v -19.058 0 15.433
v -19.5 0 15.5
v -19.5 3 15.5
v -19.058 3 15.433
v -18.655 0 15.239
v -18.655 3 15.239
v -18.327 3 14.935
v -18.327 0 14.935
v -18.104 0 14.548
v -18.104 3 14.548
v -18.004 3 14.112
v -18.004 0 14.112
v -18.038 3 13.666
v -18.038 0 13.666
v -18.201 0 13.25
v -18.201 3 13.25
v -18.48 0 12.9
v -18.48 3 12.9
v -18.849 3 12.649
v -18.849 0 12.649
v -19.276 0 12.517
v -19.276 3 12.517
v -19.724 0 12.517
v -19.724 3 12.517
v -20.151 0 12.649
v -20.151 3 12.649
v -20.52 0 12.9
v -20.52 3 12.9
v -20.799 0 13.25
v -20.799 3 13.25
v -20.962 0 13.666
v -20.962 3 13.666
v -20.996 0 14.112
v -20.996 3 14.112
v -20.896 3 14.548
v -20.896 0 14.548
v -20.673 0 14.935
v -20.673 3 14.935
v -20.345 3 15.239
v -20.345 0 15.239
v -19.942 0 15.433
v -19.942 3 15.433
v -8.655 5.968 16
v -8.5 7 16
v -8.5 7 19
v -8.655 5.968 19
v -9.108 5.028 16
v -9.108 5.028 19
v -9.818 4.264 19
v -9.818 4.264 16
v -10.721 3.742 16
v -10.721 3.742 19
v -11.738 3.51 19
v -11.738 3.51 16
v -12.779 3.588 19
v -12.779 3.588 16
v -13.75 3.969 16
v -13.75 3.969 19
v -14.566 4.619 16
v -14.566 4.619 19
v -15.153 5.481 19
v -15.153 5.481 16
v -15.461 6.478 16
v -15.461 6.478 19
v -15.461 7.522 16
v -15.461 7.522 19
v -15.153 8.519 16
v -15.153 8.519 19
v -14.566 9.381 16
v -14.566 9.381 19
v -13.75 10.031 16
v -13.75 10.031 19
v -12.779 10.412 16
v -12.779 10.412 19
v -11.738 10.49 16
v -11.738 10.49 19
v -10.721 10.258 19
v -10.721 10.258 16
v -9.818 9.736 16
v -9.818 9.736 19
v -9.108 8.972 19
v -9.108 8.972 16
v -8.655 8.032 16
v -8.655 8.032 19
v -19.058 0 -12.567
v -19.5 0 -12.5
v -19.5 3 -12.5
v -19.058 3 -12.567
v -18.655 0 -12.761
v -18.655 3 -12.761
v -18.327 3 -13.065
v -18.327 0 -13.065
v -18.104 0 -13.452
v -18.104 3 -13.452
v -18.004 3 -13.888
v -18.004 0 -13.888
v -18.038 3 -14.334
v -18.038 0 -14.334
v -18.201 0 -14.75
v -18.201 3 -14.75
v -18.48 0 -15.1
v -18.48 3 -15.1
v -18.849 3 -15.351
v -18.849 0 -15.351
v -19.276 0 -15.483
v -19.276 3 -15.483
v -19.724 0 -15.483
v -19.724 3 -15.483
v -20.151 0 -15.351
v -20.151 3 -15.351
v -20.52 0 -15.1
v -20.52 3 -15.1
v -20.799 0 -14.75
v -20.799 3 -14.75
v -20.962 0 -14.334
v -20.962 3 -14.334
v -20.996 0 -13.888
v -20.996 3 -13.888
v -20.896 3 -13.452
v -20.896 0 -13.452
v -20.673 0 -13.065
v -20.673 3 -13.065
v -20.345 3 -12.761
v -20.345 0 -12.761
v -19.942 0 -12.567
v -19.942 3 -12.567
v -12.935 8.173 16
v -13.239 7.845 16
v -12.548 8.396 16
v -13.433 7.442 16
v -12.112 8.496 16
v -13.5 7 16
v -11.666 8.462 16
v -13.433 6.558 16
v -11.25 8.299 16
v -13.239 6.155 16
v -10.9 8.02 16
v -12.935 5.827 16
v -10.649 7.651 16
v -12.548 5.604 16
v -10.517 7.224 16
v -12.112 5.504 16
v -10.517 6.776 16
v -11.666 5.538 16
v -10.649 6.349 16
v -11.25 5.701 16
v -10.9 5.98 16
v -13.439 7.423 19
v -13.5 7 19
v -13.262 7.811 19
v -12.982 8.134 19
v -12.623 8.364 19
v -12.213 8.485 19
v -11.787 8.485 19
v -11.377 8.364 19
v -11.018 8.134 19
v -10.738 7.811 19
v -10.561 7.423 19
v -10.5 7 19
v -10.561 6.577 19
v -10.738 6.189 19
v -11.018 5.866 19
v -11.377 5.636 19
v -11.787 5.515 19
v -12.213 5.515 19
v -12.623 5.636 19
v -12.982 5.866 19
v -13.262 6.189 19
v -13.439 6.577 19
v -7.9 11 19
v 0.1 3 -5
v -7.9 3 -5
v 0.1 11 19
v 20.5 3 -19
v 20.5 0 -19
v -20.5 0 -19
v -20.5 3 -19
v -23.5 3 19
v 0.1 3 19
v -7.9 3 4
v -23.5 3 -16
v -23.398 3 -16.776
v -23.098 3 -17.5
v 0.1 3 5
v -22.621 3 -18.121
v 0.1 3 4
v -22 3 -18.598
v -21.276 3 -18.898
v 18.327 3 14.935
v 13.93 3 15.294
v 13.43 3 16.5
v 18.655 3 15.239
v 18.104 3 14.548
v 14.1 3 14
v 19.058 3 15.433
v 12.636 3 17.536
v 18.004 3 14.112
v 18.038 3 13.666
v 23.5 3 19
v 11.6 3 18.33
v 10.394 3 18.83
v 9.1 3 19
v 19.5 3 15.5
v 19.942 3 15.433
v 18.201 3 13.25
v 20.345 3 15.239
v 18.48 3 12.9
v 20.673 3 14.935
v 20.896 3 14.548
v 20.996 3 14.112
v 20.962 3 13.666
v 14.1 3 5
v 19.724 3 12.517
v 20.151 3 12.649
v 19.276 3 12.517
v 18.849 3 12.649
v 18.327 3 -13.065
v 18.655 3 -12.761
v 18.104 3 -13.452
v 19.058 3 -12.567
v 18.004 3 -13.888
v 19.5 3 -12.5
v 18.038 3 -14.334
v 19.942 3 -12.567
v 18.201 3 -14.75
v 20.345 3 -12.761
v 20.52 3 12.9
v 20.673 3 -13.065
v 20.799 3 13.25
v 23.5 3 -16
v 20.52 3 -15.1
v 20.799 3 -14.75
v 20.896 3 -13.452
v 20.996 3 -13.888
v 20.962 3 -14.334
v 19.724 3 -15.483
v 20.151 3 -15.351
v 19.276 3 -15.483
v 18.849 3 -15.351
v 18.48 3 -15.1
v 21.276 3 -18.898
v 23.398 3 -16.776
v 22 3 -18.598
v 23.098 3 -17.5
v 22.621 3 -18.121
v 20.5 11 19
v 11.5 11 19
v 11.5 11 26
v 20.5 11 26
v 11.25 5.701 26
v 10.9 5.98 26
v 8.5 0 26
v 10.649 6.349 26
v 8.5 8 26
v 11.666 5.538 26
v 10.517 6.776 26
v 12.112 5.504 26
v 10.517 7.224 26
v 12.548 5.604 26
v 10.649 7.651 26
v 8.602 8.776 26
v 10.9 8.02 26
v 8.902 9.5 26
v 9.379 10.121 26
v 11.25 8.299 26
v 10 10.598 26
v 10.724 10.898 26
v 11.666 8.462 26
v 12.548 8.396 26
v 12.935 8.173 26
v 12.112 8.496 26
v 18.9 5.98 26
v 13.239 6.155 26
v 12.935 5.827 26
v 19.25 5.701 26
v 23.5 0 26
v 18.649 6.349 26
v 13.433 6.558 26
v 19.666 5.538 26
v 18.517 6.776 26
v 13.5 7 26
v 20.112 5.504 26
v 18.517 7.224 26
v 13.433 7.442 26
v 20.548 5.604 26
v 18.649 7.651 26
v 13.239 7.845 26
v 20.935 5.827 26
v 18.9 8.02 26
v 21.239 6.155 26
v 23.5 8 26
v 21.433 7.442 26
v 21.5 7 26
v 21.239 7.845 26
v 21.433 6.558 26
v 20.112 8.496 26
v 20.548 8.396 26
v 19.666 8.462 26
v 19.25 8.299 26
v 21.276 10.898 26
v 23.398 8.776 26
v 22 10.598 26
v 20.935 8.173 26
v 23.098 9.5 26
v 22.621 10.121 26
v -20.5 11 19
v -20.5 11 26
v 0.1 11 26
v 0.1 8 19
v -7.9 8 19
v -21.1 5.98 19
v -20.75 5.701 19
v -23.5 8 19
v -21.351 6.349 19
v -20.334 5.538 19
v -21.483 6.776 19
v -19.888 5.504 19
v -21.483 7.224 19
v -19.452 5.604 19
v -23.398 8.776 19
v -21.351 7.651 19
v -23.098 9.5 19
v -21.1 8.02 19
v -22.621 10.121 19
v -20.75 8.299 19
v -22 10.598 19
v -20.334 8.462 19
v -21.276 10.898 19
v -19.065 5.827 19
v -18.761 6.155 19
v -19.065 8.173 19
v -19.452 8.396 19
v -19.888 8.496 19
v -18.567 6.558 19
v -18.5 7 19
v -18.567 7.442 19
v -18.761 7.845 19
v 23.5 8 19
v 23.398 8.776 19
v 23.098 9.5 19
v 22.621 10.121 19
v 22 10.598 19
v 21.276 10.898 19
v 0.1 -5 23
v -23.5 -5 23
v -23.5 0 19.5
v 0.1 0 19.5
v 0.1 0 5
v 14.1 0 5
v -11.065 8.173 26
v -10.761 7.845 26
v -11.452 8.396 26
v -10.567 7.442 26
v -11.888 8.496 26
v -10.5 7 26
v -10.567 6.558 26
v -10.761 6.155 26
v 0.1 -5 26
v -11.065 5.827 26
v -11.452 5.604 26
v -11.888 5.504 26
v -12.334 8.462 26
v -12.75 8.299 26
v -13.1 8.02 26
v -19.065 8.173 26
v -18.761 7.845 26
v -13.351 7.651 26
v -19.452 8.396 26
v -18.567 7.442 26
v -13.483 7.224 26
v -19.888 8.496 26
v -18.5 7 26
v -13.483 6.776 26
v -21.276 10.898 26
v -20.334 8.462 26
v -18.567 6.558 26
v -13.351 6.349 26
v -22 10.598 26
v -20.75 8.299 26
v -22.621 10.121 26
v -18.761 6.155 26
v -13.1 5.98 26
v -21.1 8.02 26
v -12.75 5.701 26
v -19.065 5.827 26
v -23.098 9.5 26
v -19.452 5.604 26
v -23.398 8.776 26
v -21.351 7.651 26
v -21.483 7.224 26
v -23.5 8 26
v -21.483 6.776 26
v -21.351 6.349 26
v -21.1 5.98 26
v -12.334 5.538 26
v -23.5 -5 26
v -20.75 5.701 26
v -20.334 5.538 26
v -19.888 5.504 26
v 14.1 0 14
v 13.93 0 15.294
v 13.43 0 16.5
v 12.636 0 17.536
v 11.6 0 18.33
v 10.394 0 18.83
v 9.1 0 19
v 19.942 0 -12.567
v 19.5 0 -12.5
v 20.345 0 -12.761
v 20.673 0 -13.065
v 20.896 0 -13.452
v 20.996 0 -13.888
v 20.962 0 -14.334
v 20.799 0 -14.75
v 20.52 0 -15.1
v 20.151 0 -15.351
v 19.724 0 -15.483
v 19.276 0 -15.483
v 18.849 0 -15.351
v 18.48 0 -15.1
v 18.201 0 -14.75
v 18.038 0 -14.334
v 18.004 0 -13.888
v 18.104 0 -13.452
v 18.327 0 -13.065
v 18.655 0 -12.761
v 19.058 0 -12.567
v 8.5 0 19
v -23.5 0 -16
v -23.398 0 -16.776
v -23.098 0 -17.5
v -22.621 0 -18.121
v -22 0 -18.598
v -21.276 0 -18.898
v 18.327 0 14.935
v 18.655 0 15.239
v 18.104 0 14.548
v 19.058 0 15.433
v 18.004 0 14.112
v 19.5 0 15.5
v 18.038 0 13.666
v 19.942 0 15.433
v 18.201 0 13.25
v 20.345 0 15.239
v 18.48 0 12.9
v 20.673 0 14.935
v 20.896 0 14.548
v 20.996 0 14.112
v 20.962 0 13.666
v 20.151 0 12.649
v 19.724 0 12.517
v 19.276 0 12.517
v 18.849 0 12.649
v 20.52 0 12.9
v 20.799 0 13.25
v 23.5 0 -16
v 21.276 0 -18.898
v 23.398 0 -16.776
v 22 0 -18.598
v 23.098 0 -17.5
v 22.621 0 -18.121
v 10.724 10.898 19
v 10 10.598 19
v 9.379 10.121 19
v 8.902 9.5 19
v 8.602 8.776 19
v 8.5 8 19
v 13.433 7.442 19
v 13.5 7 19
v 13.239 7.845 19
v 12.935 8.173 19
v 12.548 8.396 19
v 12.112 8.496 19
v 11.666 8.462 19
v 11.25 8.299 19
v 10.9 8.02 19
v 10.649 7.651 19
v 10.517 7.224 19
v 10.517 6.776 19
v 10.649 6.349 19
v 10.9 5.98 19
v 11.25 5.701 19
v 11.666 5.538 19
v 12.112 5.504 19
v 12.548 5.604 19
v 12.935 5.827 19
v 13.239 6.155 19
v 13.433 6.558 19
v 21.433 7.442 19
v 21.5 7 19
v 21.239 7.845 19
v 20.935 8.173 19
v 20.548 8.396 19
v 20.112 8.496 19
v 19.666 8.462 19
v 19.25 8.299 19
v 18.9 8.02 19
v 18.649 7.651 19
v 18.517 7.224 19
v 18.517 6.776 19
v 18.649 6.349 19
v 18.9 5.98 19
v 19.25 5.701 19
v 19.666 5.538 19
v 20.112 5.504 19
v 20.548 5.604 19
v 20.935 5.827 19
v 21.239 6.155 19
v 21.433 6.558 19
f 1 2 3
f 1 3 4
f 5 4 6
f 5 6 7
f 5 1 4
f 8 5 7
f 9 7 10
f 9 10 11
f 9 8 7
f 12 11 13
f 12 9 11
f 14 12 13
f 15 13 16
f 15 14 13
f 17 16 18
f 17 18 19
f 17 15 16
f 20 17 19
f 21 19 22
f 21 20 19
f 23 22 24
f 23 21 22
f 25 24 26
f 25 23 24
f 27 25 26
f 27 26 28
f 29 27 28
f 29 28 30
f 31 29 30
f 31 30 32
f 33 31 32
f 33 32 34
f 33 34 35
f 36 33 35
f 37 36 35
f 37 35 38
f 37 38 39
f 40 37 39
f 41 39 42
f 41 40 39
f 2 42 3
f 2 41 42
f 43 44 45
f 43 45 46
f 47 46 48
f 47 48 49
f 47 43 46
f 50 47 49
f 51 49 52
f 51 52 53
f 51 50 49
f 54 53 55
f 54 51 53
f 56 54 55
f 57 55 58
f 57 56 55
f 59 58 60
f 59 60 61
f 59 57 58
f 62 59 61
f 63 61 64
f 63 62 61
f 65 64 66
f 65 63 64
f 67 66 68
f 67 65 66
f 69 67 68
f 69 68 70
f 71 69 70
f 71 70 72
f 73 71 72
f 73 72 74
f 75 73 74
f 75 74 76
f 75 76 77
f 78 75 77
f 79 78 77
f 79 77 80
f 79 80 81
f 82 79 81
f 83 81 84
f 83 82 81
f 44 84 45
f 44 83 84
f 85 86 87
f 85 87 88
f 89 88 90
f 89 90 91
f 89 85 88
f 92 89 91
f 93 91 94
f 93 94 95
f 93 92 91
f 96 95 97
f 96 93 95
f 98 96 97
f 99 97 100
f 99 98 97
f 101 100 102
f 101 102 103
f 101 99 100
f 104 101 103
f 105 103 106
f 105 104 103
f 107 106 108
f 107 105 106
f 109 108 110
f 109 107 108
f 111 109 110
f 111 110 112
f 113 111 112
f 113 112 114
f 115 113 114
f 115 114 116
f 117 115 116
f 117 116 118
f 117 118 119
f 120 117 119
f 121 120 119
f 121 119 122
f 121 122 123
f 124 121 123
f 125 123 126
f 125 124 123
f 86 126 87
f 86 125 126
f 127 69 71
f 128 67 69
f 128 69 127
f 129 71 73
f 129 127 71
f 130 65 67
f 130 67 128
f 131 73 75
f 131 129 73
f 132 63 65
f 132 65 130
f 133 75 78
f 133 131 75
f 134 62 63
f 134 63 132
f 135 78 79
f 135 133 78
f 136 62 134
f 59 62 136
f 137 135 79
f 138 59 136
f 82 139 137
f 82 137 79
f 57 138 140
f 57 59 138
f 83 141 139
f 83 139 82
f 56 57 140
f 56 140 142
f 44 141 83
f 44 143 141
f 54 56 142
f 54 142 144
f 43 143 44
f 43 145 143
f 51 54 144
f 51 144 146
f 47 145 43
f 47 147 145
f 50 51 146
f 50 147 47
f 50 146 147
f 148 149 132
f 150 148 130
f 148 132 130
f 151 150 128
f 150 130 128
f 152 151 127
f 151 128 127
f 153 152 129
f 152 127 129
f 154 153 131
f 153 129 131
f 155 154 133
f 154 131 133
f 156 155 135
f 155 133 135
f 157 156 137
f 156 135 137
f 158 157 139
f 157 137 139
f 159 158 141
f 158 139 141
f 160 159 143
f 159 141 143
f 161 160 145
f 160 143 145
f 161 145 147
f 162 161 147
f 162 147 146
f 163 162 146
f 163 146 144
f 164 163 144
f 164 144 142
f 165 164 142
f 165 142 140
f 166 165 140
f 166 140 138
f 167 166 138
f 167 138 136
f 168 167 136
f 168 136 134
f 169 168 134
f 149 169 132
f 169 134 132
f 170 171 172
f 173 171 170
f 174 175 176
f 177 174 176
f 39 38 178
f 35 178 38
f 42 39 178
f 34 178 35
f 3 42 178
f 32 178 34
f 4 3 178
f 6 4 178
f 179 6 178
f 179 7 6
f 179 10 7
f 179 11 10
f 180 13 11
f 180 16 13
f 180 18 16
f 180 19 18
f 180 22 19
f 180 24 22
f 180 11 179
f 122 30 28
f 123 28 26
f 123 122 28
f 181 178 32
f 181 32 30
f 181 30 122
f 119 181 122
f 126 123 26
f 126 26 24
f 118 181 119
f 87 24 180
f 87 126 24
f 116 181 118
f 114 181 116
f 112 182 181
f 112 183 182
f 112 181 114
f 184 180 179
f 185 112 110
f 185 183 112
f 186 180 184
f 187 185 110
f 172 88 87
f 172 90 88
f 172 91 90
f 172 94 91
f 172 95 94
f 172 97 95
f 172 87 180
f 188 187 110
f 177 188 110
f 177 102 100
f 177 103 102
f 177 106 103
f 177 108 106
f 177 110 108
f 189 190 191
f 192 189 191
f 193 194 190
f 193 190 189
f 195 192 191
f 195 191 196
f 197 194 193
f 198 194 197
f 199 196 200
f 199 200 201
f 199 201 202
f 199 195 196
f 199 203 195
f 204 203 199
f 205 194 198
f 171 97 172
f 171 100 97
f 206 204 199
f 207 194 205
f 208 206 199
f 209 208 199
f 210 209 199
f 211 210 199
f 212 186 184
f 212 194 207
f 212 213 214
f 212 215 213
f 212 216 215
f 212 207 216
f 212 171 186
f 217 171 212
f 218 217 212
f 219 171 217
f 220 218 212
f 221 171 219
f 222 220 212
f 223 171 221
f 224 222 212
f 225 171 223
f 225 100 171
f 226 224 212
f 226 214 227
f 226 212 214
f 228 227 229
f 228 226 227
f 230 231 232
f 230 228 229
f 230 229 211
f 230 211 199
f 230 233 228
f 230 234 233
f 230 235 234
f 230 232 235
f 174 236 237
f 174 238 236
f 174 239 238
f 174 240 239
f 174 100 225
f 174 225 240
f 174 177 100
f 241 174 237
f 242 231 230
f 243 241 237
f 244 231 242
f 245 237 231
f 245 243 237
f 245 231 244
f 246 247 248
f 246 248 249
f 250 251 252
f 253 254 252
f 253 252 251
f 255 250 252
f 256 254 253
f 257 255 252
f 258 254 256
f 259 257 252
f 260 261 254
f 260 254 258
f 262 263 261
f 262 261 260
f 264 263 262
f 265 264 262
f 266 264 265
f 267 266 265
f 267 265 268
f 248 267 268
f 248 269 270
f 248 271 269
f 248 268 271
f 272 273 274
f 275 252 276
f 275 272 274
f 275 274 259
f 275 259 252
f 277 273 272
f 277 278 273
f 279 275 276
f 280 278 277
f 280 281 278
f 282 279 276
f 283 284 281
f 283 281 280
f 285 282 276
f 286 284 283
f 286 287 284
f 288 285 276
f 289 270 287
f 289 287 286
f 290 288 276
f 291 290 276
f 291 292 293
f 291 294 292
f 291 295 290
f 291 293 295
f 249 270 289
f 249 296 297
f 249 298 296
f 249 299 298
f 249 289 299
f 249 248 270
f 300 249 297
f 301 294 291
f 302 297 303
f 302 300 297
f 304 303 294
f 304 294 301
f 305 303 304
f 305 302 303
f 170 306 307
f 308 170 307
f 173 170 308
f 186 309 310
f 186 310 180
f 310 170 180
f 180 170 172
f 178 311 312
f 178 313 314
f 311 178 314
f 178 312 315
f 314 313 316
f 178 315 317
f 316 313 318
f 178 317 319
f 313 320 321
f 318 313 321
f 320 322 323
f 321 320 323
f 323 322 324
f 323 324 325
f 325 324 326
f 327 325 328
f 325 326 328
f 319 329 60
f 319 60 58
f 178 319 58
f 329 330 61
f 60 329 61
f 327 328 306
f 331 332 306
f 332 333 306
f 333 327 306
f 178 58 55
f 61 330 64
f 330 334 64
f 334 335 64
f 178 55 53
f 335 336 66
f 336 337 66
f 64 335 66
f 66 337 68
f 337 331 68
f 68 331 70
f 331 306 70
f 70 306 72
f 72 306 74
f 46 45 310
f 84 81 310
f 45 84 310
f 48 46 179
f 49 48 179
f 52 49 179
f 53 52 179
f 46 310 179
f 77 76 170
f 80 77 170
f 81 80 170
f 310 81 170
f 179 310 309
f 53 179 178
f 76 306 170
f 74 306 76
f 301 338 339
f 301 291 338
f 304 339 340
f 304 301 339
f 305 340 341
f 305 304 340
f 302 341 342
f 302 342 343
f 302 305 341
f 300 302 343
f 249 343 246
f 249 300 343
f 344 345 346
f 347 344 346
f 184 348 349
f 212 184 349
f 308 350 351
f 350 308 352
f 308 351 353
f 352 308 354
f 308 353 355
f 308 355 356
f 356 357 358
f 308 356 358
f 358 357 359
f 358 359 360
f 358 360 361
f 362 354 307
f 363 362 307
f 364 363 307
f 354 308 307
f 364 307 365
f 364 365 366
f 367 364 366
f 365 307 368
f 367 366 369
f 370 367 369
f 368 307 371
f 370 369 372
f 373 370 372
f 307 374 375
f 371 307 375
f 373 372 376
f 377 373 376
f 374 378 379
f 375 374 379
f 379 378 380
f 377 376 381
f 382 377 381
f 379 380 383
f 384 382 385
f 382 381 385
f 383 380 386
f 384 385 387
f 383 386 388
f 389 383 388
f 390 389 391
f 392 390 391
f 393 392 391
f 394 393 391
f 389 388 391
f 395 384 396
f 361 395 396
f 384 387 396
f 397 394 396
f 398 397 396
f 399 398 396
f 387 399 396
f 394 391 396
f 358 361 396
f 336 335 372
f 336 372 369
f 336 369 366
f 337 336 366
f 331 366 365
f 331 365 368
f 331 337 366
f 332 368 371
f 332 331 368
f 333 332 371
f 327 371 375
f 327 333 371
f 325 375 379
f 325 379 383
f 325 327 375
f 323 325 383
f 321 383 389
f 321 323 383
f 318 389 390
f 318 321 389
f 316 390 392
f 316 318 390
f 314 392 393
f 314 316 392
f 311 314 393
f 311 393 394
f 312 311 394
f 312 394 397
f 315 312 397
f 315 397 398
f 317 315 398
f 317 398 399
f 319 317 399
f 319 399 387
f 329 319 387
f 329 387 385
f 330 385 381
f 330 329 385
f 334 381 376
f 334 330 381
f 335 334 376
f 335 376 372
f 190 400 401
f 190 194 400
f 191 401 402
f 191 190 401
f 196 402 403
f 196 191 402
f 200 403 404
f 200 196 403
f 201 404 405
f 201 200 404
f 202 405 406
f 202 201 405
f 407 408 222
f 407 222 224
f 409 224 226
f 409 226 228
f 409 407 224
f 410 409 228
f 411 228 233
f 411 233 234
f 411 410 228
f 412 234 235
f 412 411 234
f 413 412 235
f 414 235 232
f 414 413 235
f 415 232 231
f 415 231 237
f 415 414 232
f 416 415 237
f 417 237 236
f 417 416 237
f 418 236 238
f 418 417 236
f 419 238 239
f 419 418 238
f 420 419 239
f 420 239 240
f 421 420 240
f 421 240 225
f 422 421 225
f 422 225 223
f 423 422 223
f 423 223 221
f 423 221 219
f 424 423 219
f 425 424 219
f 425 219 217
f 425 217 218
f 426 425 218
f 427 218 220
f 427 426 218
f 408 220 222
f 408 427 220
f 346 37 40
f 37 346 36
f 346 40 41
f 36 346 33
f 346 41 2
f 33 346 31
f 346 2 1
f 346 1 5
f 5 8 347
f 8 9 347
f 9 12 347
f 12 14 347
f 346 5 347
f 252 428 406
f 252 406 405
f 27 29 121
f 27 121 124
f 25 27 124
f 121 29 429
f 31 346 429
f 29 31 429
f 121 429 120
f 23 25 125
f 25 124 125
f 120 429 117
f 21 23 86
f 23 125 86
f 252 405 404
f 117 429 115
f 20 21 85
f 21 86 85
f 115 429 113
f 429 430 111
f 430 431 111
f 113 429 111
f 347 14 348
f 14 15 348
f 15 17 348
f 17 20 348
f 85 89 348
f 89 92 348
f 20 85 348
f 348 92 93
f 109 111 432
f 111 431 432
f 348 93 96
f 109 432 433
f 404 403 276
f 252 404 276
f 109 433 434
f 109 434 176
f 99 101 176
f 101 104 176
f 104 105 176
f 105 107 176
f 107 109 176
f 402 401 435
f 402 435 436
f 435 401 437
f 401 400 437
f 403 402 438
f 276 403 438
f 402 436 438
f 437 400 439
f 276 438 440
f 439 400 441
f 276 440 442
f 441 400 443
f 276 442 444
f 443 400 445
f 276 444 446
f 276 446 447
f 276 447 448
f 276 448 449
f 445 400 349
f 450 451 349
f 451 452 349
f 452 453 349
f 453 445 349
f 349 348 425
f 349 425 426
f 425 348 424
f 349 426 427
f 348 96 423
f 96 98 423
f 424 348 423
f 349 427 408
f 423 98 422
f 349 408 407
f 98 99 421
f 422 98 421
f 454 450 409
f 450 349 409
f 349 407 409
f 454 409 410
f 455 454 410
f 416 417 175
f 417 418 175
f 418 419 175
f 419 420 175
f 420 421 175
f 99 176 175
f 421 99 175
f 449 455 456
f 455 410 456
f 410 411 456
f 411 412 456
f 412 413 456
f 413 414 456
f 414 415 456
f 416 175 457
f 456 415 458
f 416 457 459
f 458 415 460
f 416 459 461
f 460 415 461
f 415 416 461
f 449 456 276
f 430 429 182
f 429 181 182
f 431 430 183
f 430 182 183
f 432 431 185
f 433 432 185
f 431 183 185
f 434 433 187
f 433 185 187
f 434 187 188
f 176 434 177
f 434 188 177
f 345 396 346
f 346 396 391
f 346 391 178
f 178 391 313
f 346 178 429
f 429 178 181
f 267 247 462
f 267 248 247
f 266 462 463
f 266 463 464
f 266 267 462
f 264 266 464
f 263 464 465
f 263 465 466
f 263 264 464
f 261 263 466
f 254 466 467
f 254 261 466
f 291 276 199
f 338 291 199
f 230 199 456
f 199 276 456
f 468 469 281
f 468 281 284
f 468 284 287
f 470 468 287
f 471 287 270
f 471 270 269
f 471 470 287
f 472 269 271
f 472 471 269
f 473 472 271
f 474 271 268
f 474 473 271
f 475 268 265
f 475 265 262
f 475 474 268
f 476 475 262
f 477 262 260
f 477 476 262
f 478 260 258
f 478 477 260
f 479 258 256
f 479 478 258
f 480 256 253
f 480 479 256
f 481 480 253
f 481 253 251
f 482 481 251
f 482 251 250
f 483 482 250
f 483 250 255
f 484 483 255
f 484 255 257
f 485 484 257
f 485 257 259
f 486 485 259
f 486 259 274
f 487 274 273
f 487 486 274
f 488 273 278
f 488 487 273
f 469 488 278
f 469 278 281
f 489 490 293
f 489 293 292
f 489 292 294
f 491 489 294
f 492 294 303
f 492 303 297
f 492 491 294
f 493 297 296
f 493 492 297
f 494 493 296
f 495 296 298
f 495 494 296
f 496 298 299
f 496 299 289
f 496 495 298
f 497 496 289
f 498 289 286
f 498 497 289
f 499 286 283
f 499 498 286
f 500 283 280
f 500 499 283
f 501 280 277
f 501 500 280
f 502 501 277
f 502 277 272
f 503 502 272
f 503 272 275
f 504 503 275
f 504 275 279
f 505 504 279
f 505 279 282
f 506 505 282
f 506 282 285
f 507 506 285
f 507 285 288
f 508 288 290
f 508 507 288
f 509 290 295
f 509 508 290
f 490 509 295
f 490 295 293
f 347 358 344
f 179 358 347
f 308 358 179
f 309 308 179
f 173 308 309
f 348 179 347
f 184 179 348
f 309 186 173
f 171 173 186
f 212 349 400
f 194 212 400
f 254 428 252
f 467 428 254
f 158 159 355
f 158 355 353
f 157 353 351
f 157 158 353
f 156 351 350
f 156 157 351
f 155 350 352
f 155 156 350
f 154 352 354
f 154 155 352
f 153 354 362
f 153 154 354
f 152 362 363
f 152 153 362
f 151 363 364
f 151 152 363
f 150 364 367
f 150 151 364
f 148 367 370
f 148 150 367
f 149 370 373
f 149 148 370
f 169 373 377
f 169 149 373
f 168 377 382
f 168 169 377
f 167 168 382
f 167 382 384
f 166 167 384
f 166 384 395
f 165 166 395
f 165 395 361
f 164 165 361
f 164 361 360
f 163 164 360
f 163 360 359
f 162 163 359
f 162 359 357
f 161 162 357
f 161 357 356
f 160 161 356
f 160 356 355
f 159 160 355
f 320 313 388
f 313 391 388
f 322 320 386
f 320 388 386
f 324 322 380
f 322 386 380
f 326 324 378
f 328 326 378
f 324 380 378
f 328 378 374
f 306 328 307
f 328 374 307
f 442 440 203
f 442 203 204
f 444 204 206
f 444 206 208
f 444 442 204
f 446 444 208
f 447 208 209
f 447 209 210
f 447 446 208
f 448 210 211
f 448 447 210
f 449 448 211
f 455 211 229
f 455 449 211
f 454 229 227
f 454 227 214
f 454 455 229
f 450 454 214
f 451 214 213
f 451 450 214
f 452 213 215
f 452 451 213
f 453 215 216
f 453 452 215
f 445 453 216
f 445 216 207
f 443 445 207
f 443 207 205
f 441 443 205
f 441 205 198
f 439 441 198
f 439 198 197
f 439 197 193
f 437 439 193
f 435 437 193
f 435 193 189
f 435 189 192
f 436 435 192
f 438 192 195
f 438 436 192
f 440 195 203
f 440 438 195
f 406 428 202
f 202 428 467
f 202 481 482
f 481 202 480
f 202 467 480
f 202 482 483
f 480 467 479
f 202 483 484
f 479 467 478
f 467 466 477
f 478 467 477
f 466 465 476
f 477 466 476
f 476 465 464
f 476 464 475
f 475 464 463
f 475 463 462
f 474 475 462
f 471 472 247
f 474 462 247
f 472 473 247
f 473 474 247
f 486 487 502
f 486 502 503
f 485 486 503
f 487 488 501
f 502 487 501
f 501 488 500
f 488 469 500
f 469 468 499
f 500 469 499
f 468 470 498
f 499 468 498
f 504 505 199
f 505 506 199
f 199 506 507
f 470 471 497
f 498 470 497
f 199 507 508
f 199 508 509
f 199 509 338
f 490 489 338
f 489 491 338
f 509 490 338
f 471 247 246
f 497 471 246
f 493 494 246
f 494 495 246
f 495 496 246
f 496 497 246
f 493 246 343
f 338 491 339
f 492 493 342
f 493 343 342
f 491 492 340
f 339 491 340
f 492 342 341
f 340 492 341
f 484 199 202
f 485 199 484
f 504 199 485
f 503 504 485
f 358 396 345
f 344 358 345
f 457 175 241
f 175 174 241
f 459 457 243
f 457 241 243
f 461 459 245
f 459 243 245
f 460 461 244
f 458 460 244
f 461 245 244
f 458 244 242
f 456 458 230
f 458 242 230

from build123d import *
from build123d.topology import SkipClean

# Parameters (mm, degrees)
SKETCH_1_R      = 1.5
EXTRUDE_1_DEPTH = 3
SKETCH_2_W      = 23.5
SKETCH_2_H      = 11
SKETCH_2_R      = 1.5
SKETCH_2_W_2    = 0.1
SKETCH_2_W_3    = 15
EXTRUDE_2_DEPTH = 7
EXTRUDE_3_DEPTH = 8
FILLET_4_R      = 3
EXTRUDE_4_DEPTH = 23.6
FILLET_5_R      = 5
FILLET_6_R      = 3
EXTRUDE_START   = 3
SKETCH_7_R      = 3.5
SKETCH_7_R_2    = 1.5
EXTRUDE_5_DEPTH = 3


with BuildPart() as part:
    # 草图1 → 凸台-拉伸1 (new body)
    with BuildSketch(Plane(origin=(0, 0, 0), x_dir=(1, 0, 0), z_dir=(0, 1, 0))):
        Polygon((-23.5, 19), (-23.5, -19), (0.1, -19), (0.1, -5), (14.1, -5), (14.1, -19), (23.5, -19), (23.5, 19), align=None)
        with Locations(Location((-19.5, -14, 0), (0, 0, 270))):
            Circle(SKETCH_1_R, mode=Mode.SUBTRACT)
        with Locations(Location((19.5, -14, 0), (0, 0, 270))):
            Circle(SKETCH_1_R, mode=Mode.SUBTRACT)
        with Locations(Location((-19.5, 14, 0), (0, 0, 270))):
            Circle(SKETCH_1_R, mode=Mode.SUBTRACT)
        with Locations(Location((19.5, 14, 0), (0, 0, 270))):
            Circle(SKETCH_1_R, mode=Mode.SUBTRACT)
    extrude(amount=EXTRUDE_1_DEPTH)

    # 草图2 → 凸台-拉伸2 (add)
    # profile 1 of 3: a face of its own
    with BuildSketch(Plane.XY.offset(19)):
        with Locations((-11.75, 5.5)):
            Rectangle(SKETCH_2_W, SKETCH_2_H)
        with Locations((-20, 7)):
            Circle(SKETCH_2_R, mode=Mode.SUBTRACT)
        with Locations((-12, 7)):
            Circle(SKETCH_2_R, mode=Mode.SUBTRACT)
    # profile 2 of 3: a face of its own
    with BuildSketch(Plane.XY.offset(19)):
        with Locations((0.05, 5.5)):
            Rectangle(SKETCH_2_W_2, SKETCH_2_H)
    # profile 3 of 3: a face of its own
    with BuildSketch(Plane.XY.offset(19)):
        with Locations((16, 5.5)):
            Rectangle(SKETCH_2_W_3, SKETCH_2_H)
        with Locations((12, 7)):
            Circle(SKETCH_2_R, mode=Mode.SUBTRACT)
        with Locations((20, 7)):
            Circle(SKETCH_2_R, mode=Mode.SUBTRACT)
    extrude(amount=EXTRUDE_2_DEPTH)

    # 草图3 → 凸台-拉伸3 (add)
    with BuildSketch(Plane(origin=(0.1, 0, 0), x_dir=(0, 0, -1), z_dir=(1, 0, 0))):
        Polygon((-19, 11), (-19, 8), (-4, 3), (5, 3), align=None)
    extrude(amount=-EXTRUDE_3_DEPTH)

    # 圆角4
    fillet_4_edges = [part.edges().sort_by_distance(p)[0] for p in [
        (-23.5, 11, 22.5),
        (23.5, 11, 22.5),
        (8.5, 11, 22.5),
    ]]
    fillet(fillet_4_edges, radius=FILLET_4_R)

    # 草图4 → 凸台-拉伸4 (add)
    with BuildSketch(Plane.ZY.offset(23.5)):
        Polygon((26, 0), (26, -5), (23, -5), (19.5, 0), align=None)
    extrude(amount=-EXTRUDE_4_DEPTH)

    # 圆角5
    fillet_5_edges = [part.edges().sort_by_distance(p)[0] for p in [
        (14.1, 1.5, 19),
    ]]
    fillet(fillet_5_edges, radius=FILLET_5_R)

    # 圆角6
    fillet_6_edges = [part.edges().sort_by_distance(p)[0] for p in [
        (-23.5, 1.5, -19),
        (23.5, 1.5, -19),
    ]]
    fillet(fillet_6_edges, radius=FILLET_6_R)

    # 草图7 → 凸台-拉伸5 (add)
    with SkipClean():  # the faces are left unmerged after this step: merging them gives an invalid solid
        with BuildSketch(Plane(origin=(0, 0, 19), x_dir=(-1, 0, 0), z_dir=(0, 0, -1)).offset(EXTRUDE_START)):
            with Locations(Location((12, 7, 0), (0, 0, 180))):
                Circle(SKETCH_7_R)
            with Locations((12, 7)):
                Circle(SKETCH_7_R_2, mode=Mode.SUBTRACT)
        extrude(amount=-EXTRUDE_5_DEPTH)


solid = part.part
